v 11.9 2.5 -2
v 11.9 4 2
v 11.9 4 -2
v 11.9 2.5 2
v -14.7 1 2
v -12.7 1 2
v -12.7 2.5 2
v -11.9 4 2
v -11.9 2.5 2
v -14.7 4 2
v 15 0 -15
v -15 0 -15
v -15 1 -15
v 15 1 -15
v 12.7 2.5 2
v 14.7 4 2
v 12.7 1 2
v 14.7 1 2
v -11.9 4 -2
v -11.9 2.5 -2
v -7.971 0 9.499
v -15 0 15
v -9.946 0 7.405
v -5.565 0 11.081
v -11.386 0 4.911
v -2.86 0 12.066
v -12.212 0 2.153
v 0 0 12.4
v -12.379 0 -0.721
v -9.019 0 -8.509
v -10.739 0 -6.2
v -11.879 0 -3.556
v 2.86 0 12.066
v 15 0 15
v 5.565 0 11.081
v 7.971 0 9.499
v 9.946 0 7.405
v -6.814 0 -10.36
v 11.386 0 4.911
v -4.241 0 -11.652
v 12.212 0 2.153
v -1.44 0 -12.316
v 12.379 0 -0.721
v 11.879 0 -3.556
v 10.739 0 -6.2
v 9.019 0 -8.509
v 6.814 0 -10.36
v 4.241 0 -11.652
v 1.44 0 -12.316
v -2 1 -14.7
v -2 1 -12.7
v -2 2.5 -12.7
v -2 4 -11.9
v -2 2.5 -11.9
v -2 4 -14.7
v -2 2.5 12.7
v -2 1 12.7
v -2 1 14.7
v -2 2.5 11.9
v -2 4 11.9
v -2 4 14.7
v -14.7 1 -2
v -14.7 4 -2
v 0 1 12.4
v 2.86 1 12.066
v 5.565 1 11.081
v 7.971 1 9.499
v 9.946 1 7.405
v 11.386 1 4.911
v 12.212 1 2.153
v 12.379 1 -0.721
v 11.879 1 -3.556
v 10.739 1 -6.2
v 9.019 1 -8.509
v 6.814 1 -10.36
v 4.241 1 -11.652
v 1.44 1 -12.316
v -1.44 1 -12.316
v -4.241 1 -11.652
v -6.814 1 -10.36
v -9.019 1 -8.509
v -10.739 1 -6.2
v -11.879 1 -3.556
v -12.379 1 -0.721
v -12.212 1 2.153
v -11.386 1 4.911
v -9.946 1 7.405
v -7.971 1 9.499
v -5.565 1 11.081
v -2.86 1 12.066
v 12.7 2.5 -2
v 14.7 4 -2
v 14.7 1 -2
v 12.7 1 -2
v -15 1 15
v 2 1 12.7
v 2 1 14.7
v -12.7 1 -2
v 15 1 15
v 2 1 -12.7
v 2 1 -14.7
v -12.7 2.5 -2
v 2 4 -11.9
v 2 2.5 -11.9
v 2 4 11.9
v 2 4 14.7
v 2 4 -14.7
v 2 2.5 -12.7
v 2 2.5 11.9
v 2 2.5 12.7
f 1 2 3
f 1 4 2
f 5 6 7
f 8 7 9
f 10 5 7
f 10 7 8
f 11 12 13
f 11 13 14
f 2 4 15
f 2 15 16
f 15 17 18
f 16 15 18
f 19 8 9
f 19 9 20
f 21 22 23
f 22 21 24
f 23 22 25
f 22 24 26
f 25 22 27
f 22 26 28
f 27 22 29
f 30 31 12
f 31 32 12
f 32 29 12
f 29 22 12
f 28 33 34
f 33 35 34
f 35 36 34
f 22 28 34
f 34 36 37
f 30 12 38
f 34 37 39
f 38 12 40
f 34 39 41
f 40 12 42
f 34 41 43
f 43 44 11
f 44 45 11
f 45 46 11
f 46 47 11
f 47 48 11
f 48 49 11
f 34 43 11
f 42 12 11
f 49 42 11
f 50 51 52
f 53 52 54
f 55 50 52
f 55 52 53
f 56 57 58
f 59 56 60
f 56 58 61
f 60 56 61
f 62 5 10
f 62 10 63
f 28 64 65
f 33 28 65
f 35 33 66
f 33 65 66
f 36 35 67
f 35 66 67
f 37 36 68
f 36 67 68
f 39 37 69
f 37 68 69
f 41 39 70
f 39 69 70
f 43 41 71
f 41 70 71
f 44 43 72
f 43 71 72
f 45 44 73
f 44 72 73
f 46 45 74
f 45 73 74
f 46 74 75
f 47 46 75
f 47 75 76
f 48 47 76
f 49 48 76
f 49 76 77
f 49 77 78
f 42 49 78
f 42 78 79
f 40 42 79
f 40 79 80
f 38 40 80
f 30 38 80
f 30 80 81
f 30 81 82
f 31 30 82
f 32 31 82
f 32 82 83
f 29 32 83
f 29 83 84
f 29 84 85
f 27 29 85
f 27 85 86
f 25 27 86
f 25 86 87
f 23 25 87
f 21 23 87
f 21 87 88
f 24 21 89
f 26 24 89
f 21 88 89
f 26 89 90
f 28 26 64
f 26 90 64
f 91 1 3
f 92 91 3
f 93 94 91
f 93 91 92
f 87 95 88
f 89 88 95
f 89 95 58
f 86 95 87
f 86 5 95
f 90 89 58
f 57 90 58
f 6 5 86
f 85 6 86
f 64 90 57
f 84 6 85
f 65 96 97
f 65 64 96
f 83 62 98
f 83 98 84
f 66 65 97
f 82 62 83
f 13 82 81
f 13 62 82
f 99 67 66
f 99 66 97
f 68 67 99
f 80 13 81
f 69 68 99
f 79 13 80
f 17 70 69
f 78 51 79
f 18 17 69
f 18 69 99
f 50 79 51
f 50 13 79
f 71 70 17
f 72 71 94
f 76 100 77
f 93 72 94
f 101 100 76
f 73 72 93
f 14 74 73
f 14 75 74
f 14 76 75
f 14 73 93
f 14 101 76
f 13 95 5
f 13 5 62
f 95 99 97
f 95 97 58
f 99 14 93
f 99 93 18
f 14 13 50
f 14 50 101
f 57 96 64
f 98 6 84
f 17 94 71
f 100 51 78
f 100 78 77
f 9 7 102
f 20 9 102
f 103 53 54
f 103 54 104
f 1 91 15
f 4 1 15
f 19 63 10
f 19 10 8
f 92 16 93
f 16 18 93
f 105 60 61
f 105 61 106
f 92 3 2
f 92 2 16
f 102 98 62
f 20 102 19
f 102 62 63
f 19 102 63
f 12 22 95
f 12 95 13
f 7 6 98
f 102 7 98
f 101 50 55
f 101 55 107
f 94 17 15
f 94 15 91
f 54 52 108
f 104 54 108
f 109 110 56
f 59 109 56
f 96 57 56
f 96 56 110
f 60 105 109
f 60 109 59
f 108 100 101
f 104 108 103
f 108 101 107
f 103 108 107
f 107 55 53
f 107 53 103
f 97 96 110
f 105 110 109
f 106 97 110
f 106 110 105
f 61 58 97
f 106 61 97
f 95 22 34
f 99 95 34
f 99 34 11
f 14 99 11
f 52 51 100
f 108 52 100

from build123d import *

# Parameters (mm, degrees)
SKETCH1_W           = 30
SKETCH1_H           = 30
BOSS_EXTRUDE1_DEPTH = 1
SKETCH2_R           = 12.4
CUT_EXTRUDE1_DEPTH  = 22.236760582
SKETCH4_W           = 2
SKETCH4_H           = 4
SKETCH4_W_2         = 4
SKETCH4_H_2         = 2
BOSS_EXTRUDE2_DEPTH = 2
SKETCH5_W           = 4
SKETCH5_H           = 0.5
BOSS_EXTRUDE3_DEPTH = 0.8
SKETCH6_W           = 4
SKETCH6_H           = 0.5
BOSS_EXTRUDE4_DEPTH = 0.8
SKETCH7_W           = 4
SKETCH7_H           = 0.5
BOSS_EXTRUDE5_DEPTH = 0.8
SKETCH8_W           = 4
SKETCH8_H           = 0.5
BOSS_EXTRUDE6_DEPTH = 0.8
SKETCH9_W           = 2.8
SKETCH9_H           = 4
SKETCH9_W_2         = 4
SKETCH9_H_2         = 2.8
BOSS_EXTRUDE7_DEPTH = 1


with BuildPart() as part:
    # Sketch1 → Boss-Extrude1 (new body)
    with BuildSketch(Plane(origin=(0, 0, 0), x_dir=(1, 0, 0), z_dir=(0, 1, 0))):
        Rectangle(SKETCH1_W, SKETCH1_H)
    extrude(amount=BOSS_EXTRUDE1_DEPTH)

    # Sketch2 → Cut-Extrude1 (cut, through all)
    with BuildSketch(Plane(origin=(0, 1, 0), x_dir=(1, 0, 0), z_dir=(0, 1, 0))):
        with Locations(Location((0, 0, 0), (0, 0, 270))):
            Circle(SKETCH2_R)
    extrude(amount=-CUT_EXTRUDE1_DEPTH, mode=Mode.SUBTRACT)

    # Sketch4 → Boss-Extrude2 (add)
    with BuildSketch(Plane(origin=(0, 1, 0), x_dir=(1, 0, 0), z_dir=(0, 1, 0))):
        with Locations((13.7, 0)):
            Rectangle(SKETCH4_W, SKETCH4_H)
        with Locations((-13.7, 0)):
            Rectangle(SKETCH4_W, SKETCH4_H)
        with Locations((0, 13.7)):
            Rectangle(SKETCH4_W_2, SKETCH4_H_2)
        with Locations((0, -13.7)):
            Rectangle(SKETCH4_W_2, SKETCH4_H_2)
    extrude(amount=BOSS_EXTRUDE2_DEPTH)

    # Sketch5 → Boss-Extrude3 (add)
    with BuildSketch(Plane.ZY.offset(-12.7)):
        with Locations((0, 2.75)):
            Rectangle(SKETCH5_W, SKETCH5_H)
    extrude(amount=BOSS_EXTRUDE3_DEPTH)

    # Sketch6 → Boss-Extrude4 (add)
    with BuildSketch(Plane(origin=(0, 0, 12.7), x_dir=(-1, 0, 0), z_dir=(0, 0, -1))):
        with Locations((0, 2.75)):
            Rectangle(SKETCH6_W, SKETCH6_H)
    extrude(amount=BOSS_EXTRUDE4_DEPTH)

    # Sketch7 → Boss-Extrude5 (add)
    with BuildSketch(Plane(origin=(-12.7, 0, 0), x_dir=(0, 0, -1), z_dir=(1, 0, 0))):
        with Locations((0, 2.75)):
            Rectangle(SKETCH7_W, SKETCH7_H)
    extrude(amount=BOSS_EXTRUDE5_DEPTH)

    # Sketch8 → Boss-Extrude6 (add)
    with BuildSketch(Plane.XY.offset(-12.7)):
        with Locations((0, 2.75)):
            Rectangle(SKETCH8_W, SKETCH8_H)
    extrude(amount=BOSS_EXTRUDE6_DEPTH)

    # Sketch9 → Boss-Extrude7 (add)
    with BuildSketch(Plane(origin=(0, 3, 0), x_dir=(1, 0, 0), z_dir=(0, 1, 0))):
        with Locations((13.3, 0)):
            Rectangle(SKETCH9_W, SKETCH9_H)
        with Locations((-13.3, 0)):
            Rectangle(SKETCH9_W, SKETCH9_H)
        with Locations((0, -13.3)):
            Rectangle(SKETCH9_W_2, SKETCH9_H_2)
        with Locations((0, 13.3)):
            Rectangle(SKETCH9_W_2, SKETCH9_H_2)
    extrude(amount=BOSS_EXTRUDE7_DEPTH)


solid = part.part
